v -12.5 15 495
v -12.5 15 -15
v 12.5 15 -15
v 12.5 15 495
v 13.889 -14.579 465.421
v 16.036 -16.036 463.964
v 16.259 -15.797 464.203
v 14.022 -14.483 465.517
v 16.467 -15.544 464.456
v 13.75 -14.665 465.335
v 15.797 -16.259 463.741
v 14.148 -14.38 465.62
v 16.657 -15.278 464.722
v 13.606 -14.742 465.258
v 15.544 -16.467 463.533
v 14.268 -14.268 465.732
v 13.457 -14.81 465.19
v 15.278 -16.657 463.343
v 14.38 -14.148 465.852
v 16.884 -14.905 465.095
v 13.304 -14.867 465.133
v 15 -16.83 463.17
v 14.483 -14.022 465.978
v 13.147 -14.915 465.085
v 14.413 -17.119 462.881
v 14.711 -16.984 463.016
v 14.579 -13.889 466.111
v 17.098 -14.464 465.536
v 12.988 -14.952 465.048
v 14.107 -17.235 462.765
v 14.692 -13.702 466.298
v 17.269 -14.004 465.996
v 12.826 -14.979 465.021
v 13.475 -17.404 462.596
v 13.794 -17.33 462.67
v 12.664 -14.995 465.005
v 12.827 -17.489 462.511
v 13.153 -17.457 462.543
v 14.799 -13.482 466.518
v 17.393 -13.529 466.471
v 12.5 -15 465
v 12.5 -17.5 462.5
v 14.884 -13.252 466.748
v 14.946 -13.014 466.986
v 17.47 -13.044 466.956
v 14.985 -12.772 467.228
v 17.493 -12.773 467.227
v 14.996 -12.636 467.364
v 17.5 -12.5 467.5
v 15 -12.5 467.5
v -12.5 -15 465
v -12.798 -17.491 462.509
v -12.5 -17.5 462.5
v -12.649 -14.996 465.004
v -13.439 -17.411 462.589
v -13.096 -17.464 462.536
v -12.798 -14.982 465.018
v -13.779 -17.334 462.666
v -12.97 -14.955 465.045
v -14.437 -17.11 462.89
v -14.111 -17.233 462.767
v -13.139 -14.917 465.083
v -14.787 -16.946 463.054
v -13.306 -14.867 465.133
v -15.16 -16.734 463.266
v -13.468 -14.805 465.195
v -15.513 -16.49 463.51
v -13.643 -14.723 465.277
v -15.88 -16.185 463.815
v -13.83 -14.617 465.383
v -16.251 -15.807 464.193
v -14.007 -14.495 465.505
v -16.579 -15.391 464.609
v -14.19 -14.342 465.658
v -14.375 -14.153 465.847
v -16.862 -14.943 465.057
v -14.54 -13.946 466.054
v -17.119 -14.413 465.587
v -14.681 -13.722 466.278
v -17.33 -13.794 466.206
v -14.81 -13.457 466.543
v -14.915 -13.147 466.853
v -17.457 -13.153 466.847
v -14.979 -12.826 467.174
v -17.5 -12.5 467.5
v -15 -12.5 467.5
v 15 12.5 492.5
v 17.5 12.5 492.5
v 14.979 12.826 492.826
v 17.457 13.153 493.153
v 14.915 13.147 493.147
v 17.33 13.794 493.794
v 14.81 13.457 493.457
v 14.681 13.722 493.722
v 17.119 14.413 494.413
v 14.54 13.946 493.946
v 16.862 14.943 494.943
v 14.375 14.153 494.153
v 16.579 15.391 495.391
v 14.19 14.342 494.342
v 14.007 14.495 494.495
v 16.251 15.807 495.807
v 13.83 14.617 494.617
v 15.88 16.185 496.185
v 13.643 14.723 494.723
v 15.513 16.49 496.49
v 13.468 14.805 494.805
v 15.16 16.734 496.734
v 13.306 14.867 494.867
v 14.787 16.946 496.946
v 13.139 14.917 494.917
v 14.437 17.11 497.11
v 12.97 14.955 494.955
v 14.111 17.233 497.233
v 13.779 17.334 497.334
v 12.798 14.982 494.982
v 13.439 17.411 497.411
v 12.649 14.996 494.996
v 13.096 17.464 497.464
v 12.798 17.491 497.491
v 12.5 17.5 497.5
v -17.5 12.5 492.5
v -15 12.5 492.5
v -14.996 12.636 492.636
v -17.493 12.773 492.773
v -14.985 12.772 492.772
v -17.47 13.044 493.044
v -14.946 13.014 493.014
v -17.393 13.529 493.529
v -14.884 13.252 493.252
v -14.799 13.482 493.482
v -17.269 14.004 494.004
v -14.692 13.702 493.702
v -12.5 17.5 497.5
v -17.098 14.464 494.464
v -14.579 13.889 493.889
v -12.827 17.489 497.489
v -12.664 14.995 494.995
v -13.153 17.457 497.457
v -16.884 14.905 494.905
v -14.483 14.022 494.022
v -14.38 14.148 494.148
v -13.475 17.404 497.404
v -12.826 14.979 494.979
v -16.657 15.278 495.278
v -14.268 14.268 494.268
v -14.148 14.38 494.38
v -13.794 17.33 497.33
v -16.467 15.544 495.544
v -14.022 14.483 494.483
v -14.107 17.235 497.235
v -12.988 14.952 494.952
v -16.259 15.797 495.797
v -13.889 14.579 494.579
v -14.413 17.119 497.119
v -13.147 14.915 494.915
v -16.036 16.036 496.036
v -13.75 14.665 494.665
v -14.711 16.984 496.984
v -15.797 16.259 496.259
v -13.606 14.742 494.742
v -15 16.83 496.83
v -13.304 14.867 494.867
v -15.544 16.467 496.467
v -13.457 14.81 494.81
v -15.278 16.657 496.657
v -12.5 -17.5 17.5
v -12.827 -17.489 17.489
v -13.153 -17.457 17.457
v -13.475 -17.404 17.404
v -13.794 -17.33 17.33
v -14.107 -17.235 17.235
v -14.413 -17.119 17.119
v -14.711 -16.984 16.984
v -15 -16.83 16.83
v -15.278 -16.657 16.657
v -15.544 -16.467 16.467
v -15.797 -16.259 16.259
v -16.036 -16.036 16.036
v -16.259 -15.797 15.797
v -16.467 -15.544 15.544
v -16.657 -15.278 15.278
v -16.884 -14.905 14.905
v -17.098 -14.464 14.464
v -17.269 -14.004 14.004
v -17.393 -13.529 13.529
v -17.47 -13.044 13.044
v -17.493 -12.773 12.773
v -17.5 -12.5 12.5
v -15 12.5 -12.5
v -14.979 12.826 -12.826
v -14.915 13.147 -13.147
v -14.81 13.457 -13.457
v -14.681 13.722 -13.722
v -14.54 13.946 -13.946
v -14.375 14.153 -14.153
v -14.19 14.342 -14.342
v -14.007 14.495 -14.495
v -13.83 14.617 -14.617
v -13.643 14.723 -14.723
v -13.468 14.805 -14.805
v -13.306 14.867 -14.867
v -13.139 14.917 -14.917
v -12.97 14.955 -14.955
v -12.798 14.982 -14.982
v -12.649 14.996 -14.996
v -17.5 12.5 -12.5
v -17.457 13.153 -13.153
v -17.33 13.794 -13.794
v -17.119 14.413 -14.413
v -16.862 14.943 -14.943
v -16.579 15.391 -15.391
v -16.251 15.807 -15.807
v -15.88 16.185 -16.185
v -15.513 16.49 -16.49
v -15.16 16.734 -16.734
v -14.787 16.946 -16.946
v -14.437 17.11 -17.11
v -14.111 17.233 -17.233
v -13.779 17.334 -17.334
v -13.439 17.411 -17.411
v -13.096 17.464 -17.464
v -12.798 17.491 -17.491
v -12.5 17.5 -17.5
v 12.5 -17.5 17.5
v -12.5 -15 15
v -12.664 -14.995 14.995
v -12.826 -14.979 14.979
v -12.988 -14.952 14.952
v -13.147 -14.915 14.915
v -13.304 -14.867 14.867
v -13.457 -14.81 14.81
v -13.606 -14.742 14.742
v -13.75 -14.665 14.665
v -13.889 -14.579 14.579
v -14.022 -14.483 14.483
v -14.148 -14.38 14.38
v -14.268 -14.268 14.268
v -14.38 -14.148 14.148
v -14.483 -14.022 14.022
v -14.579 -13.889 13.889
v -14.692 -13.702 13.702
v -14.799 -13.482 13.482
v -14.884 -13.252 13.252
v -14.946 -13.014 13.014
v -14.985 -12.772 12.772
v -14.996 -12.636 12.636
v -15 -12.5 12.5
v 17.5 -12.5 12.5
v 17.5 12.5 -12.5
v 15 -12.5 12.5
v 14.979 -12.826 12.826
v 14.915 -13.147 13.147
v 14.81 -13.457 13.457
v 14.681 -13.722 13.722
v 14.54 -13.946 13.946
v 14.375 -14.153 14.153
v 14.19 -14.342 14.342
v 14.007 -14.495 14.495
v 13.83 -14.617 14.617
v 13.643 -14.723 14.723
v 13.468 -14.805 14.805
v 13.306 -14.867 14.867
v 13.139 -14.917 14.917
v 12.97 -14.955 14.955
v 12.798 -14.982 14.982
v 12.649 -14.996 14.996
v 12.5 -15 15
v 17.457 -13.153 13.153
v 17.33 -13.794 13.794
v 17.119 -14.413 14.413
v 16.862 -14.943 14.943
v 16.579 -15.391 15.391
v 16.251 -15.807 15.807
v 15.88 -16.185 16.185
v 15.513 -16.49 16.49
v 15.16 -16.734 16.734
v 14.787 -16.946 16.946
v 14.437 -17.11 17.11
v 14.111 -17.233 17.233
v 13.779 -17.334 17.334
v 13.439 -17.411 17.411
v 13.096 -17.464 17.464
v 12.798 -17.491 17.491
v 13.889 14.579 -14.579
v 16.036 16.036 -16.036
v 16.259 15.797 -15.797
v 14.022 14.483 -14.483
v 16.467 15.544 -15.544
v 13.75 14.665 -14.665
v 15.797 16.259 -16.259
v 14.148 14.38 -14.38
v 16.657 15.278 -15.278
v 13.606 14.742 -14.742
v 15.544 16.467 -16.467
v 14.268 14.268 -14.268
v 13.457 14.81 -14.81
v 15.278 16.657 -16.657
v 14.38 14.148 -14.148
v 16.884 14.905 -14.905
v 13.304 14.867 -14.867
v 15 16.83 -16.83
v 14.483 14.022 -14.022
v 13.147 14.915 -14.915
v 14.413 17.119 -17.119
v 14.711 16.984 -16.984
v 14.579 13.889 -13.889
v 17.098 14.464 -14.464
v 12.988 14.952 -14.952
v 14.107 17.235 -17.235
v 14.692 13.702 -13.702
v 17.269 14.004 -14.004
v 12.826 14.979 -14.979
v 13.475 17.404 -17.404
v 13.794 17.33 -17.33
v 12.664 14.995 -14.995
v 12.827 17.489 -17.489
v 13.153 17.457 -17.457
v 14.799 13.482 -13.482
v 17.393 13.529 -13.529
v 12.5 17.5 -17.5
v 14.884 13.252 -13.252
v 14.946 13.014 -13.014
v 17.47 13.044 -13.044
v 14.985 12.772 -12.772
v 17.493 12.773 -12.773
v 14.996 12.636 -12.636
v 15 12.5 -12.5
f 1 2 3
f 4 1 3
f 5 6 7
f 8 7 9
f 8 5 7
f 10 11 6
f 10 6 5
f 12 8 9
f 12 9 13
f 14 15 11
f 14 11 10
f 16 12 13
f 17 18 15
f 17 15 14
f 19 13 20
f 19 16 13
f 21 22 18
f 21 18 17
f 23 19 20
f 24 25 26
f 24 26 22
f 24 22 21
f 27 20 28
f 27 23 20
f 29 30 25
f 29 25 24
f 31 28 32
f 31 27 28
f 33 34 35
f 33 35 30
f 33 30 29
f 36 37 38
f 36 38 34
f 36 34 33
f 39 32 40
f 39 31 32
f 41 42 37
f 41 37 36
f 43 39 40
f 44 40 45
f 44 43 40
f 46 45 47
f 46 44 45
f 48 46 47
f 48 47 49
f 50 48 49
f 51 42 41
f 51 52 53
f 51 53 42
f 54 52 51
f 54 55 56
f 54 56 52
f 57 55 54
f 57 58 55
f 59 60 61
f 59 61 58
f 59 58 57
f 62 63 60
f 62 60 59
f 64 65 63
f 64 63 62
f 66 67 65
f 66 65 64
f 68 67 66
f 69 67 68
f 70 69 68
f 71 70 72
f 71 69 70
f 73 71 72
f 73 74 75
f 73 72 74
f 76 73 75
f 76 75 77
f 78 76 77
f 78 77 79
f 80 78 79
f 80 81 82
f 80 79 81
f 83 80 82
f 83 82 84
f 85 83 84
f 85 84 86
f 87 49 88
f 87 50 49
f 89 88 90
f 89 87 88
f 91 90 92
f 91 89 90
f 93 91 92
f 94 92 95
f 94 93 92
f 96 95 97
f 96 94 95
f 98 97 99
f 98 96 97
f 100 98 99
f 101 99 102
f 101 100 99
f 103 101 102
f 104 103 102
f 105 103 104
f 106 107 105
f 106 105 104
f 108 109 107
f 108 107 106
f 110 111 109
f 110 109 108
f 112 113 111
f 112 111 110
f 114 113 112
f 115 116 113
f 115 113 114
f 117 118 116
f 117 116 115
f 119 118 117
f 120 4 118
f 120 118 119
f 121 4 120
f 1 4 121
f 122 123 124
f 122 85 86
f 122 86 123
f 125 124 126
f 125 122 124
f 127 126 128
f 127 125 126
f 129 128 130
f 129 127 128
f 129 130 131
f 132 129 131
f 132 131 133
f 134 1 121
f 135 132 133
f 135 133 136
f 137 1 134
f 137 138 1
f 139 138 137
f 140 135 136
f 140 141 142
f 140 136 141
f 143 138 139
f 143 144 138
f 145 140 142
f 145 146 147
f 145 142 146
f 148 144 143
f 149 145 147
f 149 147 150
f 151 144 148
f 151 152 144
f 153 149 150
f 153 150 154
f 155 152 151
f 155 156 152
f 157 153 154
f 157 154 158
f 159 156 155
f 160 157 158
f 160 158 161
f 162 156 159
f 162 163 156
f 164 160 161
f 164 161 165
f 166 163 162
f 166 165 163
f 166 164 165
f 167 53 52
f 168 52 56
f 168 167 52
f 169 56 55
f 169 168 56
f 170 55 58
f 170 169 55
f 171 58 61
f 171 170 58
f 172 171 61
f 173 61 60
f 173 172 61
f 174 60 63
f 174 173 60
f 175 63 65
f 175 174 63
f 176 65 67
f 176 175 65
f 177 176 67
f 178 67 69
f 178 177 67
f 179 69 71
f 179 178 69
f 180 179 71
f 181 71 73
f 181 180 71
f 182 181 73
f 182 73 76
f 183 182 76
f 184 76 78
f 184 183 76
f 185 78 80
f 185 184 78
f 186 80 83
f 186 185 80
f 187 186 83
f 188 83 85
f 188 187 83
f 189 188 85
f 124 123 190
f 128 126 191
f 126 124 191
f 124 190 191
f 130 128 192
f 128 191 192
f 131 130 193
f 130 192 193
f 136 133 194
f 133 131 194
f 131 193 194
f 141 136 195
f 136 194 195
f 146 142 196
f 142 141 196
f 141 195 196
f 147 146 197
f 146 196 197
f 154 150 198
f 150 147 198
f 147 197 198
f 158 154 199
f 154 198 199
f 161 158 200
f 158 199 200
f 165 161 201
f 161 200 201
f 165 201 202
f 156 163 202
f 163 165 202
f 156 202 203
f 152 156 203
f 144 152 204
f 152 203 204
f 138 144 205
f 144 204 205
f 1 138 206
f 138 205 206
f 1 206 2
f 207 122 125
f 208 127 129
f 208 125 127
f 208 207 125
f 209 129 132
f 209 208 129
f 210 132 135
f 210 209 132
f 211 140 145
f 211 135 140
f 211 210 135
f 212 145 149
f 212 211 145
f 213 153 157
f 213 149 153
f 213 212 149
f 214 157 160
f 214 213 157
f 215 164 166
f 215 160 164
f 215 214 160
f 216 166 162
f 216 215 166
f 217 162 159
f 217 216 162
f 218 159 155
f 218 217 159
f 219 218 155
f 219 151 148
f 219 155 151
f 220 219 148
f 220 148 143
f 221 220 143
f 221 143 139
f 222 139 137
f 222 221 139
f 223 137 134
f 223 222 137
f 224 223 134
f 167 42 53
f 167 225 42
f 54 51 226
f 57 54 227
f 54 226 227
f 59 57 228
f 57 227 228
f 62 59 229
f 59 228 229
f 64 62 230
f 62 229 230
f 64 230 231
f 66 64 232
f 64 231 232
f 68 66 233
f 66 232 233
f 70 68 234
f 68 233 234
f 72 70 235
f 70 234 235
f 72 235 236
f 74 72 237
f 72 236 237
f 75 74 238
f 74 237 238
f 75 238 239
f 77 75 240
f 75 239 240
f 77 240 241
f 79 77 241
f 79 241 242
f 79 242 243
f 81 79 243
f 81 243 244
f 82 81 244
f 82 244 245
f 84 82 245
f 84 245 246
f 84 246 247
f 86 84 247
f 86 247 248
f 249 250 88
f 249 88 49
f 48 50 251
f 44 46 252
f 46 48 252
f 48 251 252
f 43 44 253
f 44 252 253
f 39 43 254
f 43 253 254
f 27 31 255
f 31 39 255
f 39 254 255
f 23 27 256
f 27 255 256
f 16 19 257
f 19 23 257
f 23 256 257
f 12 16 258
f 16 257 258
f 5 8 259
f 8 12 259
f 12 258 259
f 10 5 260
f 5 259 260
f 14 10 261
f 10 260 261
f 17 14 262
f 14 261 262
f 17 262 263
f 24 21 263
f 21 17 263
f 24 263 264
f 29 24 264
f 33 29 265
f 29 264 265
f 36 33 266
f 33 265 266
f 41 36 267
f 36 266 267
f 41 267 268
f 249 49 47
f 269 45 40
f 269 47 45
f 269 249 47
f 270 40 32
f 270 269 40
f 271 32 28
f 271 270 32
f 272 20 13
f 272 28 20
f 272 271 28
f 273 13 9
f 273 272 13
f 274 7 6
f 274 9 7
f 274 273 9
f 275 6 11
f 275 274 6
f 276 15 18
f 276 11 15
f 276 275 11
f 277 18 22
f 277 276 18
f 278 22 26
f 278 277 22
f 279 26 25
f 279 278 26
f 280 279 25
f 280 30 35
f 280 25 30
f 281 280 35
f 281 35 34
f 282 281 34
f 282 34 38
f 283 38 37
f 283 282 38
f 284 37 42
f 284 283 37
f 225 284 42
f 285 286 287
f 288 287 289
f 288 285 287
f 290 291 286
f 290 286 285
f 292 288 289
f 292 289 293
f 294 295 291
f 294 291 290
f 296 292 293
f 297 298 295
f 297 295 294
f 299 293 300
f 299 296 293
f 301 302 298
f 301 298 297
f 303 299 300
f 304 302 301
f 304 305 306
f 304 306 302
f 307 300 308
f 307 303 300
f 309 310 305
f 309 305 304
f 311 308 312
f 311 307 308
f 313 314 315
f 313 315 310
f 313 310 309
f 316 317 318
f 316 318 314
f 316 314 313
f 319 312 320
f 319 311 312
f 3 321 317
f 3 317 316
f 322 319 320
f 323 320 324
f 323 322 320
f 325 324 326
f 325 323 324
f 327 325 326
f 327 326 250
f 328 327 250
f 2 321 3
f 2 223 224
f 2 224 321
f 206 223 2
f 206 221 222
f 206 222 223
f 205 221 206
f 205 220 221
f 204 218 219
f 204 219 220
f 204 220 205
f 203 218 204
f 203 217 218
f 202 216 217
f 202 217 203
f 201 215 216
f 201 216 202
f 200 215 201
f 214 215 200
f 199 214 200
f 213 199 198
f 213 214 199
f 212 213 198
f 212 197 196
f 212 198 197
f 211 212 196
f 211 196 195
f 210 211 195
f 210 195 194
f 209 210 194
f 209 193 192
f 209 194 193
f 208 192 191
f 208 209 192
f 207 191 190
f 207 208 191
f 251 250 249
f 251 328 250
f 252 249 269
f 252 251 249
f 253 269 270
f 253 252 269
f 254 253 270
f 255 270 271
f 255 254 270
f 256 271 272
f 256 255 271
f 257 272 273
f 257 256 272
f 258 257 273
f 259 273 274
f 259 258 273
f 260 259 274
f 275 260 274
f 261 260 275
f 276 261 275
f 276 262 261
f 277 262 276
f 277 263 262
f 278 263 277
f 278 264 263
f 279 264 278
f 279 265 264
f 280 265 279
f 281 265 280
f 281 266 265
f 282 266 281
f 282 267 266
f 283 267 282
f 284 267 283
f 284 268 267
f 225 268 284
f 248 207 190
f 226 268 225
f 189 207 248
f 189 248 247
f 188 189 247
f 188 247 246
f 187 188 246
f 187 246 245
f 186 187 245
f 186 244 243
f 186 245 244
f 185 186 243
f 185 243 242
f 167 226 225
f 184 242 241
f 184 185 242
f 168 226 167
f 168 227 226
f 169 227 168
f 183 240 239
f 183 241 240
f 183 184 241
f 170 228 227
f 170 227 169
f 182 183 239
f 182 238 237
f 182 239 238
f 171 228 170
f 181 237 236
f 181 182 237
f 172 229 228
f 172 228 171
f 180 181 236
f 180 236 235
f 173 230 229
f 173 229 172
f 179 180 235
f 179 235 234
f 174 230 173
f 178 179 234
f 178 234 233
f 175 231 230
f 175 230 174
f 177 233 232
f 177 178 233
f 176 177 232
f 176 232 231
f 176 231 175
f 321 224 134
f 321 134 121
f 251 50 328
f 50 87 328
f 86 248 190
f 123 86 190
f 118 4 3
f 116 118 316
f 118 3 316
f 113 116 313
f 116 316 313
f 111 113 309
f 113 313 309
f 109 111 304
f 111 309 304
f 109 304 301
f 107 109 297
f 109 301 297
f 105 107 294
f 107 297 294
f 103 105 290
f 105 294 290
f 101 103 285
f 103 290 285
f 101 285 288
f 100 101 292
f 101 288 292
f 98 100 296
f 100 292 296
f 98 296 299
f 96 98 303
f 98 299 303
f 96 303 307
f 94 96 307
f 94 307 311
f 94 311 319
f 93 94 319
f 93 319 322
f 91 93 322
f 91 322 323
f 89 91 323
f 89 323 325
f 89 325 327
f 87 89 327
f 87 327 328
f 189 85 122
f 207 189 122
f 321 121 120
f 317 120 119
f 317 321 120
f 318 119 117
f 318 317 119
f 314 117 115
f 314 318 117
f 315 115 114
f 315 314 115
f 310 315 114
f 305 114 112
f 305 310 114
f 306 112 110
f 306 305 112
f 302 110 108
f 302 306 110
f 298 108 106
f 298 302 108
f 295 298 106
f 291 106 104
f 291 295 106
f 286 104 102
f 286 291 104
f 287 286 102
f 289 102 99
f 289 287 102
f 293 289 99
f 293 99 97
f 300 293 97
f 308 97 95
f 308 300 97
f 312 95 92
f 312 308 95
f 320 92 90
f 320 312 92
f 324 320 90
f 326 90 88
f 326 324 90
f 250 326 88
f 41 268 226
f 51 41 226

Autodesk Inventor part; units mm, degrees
ref_plane "Start plane" through (0, 0, -17.5) normal (0, 0, 1) x (1, 0, 0)
ref_plane "End plane" through (0, 0, 497.5) normal (0, 0, 1) x (1, 0, 0)
sketch "Sketch" plane through (0, 0, 0) normal (0, 0, 1) x (1, 0, 0)
  line L0 (-17.5, -12.5) -> (-17.5, 12.5)
  line L1 (-12.5, 17.5) -> (12.5, 17.5)
  line L2 (17.5, 12.5) -> (17.5, -12.5)
  line L3 (12.5, -17.5) -> (-12.5, -17.5)
  arc A0 (-17.5, -12.5) -> (-12.5, -17.5) centre (-12.5, -12.5) ccw
  arc A1 (-12.5, 17.5) -> (-17.5, 12.5) centre (-12.5, 12.5) ccw
  arc A2 (17.5, 12.5) -> (12.5, 17.5) centre (12.5, 12.5) ccw
  arc A3 (12.5, -17.5) -> (17.5, -12.5) centre (12.5, -12.5) ccw
  arc A4 (-12.5, 15) -> (-15, 12.5) centre (-12.5, 12.5) ccw
  line L4 (-12.5, 15) -> (12.5, 15)
  arc A5 (15, 12.5) -> (12.5, 15) centre (12.5, 12.5) ccw
  line L5 (15, 12.5) -> (15, -12.5)
  arc A6 (12.5, -15) -> (15, -12.5) centre (12.5, -12.5) ccw
  line L6 (12.5, -15) -> (-12.5, -15)
  arc A7 (-15, -12.5) -> (-12.5, -15) centre (-12.5, -12.5) ccw
  line L7 (-15, -12.5) -> (-15, 12.5)
  line L8 (0, 25.9497) -> (0, -25.9497) construction
  line L9 (-25.9497, 0) -> (25.9497, 0) construction
  dimension "d7" = 5
  dimension "d10" = 35
  dimension "d11" = 35
  dimension "d12" = 2.5
  dimension "d15" = 17.5
  dimension "d16" = 17.5
extrude "Body" add sketch "Sketch" along normal up to surface (515 mm away) from surface at -17.5
sketch "Sketch3" plane through (0, 0, 0) normal (0, 0, 1) x (1, 0, 0)
  line L0 (0, 0) -> (10, 0)
ref_plane "Work Plane3" through (0, 0, 0) normal (0, -1, 0) x (1, 0, 0)
sketch "Sketch4" plane through (0, 0, 0) normal (0, -1, 0) x (1, 0, 0)
  line L0 (-2, -17.5) -> (12, -17.5)
  line L1 (-2, 497.5) -> (12, 497.5)
  dimension "d18" = 515
ref_plane "Work Plane4" through (17.5, 0, -17.5) normal (0, 0, -1) x (-1, 0, 0)
split "Split1" plane through (17.5, 0, -17.5) removes the side toward (0, 0, -1)
ref_plane "Work Plane5" through (0, 17.5, 497.5) normal (0, -0.7071, 0.7071) x (1, 0, 0)
split "Split2" plane through (0, 17.5, 497.5) removes the side toward (0, -0.7071, 0.7071)
ref_plane "Work Plane15" through (0, 17.5, -17.5) normal (0, -0.7071, -0.7071) x (1, 0, 0)
split "Split6" plane through (0, 17.5, -17.5) removes the side toward (0, -0.7071, -0.7071)
equation "\"d7\" = G_IR"
equation "\"d10\" = G_H"
equation "\"d11\" = G_W"
equation "\"d12\" = G_T"
equation "\"d15\" = 0.5 * d10"
equation "\"d16\" = 0.5 * d11"
equation "\"d3\" = G_L"
equation "\"G_W\" = 35"
equation "\"G_H\" = 35"
equation "\"G_T\" = 2.5"
equation "\"G_IR\" = 5"
equation "\"G_L\" = 535"
equation "\"G_OFFSET_START\" = 17.5"
equation "\"G_OFFSET_END\" = 17.5"
equation "\"d13\" = -G_OFFSET_START"
equation "\"d14\" = G_OFFSET_END + B_L"
equation "\"B_L\" = 480"
properties part number "AS 1163 - C350L0 35x35x2.5 SHS - 535" material "Steel, Mild"
